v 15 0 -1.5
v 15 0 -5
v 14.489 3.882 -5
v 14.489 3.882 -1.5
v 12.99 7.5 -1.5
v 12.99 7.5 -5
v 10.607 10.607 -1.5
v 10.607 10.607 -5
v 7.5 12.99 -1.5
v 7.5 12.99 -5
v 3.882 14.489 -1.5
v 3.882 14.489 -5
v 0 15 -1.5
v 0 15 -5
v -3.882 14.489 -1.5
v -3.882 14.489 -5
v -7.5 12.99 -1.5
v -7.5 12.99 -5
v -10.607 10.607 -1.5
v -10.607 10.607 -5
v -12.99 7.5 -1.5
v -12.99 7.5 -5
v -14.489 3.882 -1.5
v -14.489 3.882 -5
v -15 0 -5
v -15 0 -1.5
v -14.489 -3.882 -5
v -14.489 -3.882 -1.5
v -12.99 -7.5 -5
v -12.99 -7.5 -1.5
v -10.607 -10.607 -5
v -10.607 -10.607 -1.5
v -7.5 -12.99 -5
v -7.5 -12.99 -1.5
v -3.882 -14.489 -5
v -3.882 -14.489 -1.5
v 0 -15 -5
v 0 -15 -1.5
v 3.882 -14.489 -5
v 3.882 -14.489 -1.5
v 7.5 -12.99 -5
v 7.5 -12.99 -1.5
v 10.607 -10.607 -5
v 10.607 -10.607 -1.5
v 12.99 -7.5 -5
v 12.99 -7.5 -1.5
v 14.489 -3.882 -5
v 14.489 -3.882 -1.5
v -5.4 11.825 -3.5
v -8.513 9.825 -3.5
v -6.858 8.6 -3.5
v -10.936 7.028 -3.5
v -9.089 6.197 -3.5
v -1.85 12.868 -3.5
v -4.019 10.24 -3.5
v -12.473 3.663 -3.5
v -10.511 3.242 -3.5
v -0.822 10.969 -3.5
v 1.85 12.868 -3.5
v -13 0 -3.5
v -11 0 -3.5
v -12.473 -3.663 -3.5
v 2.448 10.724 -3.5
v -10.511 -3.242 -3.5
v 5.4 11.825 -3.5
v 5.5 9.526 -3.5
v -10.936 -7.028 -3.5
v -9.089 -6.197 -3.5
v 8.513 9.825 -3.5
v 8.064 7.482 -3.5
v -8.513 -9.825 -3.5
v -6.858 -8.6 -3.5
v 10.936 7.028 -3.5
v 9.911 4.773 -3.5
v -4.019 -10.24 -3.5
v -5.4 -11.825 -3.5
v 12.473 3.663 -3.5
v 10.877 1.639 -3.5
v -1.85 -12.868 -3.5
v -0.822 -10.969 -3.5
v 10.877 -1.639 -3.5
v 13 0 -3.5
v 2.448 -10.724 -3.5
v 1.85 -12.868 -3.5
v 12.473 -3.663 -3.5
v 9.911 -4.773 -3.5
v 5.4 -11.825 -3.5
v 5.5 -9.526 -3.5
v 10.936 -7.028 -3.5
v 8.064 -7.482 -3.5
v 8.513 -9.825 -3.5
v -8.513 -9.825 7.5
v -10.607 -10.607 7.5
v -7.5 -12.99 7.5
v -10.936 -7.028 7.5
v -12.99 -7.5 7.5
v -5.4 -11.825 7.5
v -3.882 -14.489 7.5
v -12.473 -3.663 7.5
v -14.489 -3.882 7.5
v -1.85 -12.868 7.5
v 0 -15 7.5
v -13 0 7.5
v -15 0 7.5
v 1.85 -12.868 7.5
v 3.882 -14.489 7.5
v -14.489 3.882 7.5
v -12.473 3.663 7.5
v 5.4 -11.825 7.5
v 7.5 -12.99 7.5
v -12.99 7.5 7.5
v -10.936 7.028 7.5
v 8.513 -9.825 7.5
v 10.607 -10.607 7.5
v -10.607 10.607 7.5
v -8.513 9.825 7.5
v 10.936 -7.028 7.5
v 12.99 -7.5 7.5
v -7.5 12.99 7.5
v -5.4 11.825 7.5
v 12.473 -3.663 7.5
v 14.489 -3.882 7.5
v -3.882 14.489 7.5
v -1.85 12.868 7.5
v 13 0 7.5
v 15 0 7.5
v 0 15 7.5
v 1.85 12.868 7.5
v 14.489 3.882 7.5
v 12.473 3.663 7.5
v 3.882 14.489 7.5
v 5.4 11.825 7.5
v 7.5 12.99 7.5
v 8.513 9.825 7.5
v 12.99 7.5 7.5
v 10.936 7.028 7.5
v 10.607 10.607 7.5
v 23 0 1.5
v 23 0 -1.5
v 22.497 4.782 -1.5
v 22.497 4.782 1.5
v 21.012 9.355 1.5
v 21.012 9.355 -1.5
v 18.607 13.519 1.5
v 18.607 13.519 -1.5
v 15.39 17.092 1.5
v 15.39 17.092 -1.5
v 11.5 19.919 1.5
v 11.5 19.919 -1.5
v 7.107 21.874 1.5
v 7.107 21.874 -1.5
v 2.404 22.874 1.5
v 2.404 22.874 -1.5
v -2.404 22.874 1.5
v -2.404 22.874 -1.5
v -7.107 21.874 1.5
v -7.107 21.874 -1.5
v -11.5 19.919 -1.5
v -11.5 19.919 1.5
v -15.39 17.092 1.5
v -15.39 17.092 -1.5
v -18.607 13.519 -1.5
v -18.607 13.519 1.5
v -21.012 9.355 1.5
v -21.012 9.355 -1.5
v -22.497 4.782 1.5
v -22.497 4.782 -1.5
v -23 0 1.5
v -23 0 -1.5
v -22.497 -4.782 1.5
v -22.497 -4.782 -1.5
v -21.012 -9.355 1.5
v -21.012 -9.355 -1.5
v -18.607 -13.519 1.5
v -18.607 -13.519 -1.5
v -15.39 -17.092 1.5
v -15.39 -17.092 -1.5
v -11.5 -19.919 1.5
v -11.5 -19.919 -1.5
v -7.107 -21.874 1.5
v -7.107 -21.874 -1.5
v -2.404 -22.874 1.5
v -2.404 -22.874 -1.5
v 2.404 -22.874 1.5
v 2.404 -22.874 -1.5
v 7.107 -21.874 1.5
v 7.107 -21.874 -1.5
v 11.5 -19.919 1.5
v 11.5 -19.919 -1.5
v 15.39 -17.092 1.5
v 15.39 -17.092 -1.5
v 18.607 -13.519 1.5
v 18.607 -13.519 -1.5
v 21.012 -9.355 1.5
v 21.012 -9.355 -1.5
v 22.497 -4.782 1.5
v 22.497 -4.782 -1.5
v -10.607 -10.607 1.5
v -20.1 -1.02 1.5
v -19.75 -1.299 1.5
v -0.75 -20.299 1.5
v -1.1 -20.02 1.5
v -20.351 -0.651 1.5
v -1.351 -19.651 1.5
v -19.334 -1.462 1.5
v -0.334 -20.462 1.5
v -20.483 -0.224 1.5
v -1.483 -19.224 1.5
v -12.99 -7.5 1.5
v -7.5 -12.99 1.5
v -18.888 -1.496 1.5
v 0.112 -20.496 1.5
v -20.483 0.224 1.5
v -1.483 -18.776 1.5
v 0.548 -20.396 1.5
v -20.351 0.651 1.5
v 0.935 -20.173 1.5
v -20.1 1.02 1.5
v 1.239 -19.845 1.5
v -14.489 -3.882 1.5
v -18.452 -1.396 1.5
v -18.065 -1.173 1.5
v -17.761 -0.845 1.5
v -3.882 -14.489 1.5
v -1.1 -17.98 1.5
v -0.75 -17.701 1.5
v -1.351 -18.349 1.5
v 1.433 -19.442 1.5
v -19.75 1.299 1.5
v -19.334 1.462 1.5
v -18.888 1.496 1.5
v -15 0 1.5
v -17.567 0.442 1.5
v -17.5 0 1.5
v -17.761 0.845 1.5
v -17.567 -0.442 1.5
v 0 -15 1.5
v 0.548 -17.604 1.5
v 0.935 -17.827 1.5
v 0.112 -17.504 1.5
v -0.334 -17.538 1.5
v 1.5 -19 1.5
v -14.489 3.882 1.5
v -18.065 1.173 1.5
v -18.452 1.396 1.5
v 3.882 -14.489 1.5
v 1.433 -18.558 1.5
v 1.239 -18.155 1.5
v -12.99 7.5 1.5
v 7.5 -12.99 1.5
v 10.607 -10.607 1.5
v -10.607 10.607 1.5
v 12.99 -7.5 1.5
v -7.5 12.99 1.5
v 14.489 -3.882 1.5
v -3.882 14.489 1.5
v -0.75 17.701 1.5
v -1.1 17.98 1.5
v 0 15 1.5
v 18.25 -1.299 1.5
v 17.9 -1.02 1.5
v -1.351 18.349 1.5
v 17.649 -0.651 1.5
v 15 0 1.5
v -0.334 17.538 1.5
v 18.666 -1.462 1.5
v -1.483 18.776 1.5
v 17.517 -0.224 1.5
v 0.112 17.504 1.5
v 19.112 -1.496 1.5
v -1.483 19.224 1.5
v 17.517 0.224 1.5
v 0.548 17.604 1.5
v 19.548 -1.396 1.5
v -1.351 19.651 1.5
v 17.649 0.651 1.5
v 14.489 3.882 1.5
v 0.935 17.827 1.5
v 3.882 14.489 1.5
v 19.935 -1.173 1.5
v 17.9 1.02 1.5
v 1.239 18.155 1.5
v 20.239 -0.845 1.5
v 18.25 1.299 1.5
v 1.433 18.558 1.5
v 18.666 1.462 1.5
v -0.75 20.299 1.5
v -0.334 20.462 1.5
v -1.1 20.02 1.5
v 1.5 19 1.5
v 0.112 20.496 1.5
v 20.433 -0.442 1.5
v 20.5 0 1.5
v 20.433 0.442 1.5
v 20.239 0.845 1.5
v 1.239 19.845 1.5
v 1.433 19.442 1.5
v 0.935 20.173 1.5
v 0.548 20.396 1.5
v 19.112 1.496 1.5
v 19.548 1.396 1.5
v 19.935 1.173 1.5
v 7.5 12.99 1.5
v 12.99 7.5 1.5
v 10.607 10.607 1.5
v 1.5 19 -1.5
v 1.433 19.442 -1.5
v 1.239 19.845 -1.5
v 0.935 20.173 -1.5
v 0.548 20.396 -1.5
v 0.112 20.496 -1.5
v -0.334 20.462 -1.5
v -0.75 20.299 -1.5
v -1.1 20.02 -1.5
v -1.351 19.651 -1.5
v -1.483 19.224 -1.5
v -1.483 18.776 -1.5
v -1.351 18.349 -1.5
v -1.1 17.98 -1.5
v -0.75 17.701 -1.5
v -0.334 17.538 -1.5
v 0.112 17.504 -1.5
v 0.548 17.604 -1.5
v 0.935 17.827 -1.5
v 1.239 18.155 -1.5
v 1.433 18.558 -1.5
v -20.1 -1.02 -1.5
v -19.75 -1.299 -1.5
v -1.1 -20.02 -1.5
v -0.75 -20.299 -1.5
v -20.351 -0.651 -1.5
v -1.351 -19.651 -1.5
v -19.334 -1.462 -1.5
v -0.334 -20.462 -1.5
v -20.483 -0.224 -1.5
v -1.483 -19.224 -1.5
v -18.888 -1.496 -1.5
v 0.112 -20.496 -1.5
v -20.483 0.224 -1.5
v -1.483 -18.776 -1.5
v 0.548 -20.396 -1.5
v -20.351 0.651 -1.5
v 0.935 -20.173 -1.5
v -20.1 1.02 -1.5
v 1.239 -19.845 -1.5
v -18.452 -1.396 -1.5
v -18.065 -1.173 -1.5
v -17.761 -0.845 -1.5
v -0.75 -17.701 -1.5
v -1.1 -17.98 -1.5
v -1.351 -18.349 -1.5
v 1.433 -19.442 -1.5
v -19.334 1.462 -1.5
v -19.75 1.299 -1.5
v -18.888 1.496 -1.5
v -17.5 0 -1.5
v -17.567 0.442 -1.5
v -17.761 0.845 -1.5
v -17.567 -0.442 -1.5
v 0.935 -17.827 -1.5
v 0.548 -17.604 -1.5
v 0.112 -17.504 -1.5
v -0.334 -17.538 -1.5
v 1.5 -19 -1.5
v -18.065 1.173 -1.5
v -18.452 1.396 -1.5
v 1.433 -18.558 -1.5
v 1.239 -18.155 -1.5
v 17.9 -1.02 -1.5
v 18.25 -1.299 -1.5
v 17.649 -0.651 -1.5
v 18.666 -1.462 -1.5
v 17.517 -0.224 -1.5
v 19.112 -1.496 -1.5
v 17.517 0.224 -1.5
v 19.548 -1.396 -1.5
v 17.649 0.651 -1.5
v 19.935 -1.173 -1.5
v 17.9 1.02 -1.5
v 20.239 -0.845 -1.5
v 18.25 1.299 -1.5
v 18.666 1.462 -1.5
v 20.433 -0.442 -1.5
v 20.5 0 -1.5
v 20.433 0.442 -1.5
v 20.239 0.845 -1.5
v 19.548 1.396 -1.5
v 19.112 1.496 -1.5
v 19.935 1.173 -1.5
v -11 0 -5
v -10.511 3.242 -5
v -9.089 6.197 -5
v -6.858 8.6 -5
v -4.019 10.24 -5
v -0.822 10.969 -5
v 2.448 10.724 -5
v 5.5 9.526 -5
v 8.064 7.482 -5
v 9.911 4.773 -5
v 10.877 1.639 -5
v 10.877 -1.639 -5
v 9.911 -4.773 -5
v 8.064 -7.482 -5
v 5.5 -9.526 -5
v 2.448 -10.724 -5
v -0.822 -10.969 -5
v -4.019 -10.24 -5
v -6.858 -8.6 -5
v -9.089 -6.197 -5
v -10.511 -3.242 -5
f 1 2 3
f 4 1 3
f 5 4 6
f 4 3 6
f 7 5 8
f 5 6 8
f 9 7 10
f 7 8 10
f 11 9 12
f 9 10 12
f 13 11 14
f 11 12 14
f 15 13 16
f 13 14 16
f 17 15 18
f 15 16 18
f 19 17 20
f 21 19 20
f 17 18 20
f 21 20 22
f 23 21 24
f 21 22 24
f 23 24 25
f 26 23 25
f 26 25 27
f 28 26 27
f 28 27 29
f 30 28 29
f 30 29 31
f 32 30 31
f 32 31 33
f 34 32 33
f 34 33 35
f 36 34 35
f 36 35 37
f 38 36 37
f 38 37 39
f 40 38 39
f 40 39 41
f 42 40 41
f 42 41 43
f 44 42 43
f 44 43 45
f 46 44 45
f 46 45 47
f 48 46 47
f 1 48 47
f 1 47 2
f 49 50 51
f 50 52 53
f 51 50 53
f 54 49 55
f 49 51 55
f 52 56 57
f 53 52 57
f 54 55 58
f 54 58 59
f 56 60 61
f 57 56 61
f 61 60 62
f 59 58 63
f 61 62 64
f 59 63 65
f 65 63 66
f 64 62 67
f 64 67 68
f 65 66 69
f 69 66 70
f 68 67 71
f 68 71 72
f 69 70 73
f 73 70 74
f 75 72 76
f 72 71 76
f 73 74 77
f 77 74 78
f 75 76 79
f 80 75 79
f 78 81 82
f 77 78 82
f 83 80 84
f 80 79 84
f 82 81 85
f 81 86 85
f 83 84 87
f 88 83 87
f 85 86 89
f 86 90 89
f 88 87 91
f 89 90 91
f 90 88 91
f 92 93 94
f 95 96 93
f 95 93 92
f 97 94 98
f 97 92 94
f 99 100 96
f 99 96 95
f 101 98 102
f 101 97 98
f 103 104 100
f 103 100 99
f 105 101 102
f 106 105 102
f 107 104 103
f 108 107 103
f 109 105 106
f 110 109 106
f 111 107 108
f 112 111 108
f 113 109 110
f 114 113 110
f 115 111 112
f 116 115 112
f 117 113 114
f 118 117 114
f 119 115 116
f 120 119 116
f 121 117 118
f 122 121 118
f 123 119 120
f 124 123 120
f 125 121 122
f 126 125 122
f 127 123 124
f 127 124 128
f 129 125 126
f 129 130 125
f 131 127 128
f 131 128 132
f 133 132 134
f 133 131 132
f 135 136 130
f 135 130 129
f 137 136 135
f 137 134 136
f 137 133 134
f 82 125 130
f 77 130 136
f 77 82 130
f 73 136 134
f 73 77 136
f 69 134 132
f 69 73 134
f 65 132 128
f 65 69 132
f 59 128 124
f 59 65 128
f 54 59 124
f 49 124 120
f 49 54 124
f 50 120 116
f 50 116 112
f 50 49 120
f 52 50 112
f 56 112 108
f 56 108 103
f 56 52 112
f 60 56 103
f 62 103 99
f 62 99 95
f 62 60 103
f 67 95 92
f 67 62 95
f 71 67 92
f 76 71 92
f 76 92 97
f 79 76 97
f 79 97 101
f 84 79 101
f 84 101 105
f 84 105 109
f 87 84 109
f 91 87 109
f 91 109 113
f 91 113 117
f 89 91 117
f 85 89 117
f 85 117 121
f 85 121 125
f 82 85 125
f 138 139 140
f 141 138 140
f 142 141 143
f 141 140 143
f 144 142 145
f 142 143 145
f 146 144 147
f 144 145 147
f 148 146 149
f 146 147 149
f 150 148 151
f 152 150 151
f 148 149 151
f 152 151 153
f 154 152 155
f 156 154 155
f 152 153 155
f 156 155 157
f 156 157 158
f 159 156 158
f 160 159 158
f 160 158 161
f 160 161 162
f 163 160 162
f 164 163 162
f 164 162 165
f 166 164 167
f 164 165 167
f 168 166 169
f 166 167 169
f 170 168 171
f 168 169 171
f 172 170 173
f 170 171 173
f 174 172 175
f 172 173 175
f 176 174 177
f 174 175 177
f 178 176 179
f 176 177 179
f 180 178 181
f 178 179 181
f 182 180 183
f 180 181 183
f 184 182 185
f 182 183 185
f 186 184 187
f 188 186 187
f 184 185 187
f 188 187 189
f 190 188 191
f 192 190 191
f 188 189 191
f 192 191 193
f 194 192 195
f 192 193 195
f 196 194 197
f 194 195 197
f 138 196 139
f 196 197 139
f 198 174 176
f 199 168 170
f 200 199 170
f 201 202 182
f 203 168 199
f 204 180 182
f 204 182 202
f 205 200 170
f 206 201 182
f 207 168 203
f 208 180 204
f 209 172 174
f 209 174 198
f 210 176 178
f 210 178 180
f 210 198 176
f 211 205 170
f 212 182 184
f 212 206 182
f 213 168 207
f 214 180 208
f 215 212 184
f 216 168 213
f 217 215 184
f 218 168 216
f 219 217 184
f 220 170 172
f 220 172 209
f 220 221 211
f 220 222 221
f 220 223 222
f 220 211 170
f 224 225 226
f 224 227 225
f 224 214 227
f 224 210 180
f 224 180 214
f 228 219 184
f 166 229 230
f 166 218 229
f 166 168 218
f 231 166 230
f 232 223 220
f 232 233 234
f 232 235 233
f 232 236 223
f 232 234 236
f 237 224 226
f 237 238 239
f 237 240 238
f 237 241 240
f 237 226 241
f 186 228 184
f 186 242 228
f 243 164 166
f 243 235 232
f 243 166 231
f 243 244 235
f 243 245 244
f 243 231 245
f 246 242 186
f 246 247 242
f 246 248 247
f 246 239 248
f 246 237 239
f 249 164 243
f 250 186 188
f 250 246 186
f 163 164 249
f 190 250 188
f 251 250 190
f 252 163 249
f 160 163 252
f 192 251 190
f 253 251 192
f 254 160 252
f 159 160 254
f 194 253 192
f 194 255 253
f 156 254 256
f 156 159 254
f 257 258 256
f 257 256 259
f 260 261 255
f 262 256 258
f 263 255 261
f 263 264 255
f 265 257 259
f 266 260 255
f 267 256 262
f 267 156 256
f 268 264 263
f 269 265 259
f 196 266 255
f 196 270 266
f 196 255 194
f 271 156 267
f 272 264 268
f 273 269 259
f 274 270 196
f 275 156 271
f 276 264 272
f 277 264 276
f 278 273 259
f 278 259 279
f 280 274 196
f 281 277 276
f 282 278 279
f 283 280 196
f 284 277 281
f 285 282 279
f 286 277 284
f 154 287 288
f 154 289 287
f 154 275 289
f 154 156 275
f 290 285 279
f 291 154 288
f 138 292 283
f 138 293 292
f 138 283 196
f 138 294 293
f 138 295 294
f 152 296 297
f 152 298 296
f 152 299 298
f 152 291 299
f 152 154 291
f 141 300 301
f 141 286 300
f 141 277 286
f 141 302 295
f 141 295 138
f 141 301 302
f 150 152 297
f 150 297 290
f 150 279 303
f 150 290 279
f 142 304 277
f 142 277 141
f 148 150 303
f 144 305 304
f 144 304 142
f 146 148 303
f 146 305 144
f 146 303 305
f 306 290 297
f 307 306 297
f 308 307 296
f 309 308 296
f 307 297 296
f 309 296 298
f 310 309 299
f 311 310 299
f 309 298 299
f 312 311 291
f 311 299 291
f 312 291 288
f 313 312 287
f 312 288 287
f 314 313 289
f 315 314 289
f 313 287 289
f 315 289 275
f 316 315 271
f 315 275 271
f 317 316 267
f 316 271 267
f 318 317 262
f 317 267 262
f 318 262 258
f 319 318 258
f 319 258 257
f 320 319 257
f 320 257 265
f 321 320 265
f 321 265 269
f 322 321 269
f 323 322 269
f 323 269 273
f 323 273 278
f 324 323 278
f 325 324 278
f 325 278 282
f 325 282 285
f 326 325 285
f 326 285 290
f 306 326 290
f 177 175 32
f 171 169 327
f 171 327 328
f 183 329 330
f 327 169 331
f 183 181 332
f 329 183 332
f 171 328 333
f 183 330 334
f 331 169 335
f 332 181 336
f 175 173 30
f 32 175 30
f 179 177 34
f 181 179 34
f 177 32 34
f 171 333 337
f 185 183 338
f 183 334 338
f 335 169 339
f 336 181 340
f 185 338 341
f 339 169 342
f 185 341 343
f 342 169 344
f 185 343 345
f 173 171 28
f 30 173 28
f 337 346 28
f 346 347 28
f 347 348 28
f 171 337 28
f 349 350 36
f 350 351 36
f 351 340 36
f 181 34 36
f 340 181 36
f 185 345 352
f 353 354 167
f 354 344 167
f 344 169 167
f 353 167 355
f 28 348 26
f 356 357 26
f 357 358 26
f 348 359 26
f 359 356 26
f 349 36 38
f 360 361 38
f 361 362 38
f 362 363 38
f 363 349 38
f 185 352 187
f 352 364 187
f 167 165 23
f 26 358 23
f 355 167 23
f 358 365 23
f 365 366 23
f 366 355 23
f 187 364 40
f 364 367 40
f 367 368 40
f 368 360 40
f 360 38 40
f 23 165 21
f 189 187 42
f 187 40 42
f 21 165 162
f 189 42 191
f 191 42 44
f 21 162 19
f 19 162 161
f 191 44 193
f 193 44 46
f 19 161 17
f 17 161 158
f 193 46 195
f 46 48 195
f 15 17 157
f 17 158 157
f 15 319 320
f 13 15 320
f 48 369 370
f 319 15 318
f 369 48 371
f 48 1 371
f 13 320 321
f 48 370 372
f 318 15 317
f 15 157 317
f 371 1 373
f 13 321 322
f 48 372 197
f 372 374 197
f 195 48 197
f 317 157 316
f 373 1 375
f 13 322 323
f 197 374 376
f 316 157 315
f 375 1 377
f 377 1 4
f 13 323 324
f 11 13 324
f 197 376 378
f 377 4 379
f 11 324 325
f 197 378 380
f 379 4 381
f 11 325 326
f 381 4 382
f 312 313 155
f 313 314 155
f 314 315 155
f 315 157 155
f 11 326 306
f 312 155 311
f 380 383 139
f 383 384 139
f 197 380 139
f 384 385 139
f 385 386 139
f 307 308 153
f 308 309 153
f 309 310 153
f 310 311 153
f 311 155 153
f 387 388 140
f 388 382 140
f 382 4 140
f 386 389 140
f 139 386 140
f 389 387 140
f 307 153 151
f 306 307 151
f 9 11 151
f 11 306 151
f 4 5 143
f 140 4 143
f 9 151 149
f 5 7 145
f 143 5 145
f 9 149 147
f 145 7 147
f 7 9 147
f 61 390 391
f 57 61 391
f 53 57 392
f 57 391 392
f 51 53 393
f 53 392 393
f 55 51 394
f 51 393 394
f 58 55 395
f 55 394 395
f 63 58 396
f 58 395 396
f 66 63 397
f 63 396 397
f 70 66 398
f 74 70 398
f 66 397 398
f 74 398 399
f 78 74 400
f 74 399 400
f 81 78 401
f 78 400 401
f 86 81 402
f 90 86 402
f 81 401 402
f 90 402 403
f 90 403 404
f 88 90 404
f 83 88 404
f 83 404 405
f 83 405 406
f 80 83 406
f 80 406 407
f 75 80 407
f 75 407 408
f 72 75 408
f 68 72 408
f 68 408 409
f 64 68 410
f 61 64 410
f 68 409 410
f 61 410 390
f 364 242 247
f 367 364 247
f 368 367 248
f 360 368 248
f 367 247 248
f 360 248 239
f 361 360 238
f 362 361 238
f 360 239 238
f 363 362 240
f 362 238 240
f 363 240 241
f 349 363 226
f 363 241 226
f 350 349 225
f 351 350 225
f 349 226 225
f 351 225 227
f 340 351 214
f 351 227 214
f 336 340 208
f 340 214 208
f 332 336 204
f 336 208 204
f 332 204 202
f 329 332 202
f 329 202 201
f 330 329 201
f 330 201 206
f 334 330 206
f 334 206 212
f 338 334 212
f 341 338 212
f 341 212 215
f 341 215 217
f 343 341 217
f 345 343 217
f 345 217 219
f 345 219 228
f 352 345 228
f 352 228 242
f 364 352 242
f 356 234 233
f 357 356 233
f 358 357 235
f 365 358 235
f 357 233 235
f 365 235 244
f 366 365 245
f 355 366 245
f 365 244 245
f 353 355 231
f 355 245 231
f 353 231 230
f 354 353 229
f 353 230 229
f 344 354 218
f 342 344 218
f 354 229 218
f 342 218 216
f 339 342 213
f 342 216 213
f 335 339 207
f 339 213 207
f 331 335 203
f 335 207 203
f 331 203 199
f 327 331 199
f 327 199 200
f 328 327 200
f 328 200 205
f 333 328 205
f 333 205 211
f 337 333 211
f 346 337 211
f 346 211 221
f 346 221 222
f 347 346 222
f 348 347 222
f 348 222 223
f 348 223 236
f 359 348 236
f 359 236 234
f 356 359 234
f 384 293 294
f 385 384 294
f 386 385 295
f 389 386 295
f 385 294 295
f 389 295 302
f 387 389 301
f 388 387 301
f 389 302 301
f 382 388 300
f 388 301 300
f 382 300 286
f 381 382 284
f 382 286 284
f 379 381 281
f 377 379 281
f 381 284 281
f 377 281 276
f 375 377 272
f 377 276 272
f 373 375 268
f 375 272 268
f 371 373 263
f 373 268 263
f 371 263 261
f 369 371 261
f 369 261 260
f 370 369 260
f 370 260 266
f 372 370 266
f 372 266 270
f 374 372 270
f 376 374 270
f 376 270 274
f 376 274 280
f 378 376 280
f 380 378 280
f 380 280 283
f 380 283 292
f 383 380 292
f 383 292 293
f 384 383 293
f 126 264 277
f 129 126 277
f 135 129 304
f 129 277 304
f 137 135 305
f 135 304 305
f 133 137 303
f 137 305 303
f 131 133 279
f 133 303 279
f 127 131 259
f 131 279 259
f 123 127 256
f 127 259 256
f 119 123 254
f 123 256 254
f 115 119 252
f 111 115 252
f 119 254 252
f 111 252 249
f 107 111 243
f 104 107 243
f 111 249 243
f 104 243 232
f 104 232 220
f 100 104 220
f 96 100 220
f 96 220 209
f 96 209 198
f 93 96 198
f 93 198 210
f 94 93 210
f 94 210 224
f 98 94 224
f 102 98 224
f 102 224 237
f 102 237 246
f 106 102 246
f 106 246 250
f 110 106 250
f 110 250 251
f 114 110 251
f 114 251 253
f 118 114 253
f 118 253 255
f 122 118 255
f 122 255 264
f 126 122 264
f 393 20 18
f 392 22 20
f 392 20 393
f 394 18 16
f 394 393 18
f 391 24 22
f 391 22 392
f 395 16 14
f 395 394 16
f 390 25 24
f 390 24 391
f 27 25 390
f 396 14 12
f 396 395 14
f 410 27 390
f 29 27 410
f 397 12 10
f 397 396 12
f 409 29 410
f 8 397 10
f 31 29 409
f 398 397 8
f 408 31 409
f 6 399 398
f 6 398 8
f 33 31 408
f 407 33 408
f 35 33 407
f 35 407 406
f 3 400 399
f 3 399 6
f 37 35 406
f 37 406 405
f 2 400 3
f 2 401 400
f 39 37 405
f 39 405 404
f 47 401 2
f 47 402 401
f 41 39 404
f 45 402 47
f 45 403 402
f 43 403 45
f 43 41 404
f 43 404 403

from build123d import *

# Parameters (mm, degrees)
BOSS_EXTRUDE1_DEPTH      = 7.5
BOSS_EXTRUDE1_DEPTH_BACK = 5
SKETCH1_R                = 15
SKETCH1_R_2              = 13
BOSS_EXTRUDE2_DEPTH      = 1.5
BOSS_EXTRUDE2_DEPTH_BACK = 1.5
SKETCH2_R                = 23
SKETCH2_R_2              = 15
SKETCH4_R                = 13
SKETCH4_R_2              = 11
BOSS_EXTRUDE3_DEPTH      = 1.5
SKETCH6_R                = 1.5
CUT_EXTRUDE1_DEPTH       = 10


with BuildPart() as part:
    # Sketch1 → Boss-Extrude1 (new, two sides: drawn at the far end of the back side and taken through both)
    with BuildSketch(Plane.XY.offset(-BOSS_EXTRUDE1_DEPTH_BACK)):
        Circle(SKETCH1_R)
        Circle(SKETCH1_R_2, mode=Mode.SUBTRACT)
    extrude(amount=BOSS_EXTRUDE1_DEPTH + BOSS_EXTRUDE1_DEPTH_BACK)

    # Sketch2 → Boss-Extrude2 (add, two sides: drawn at the far end of the back side and taken through both)
    with BuildSketch(Plane.XY.offset(-BOSS_EXTRUDE2_DEPTH_BACK)):
        Circle(SKETCH2_R)
        Circle(SKETCH2_R_2, mode=Mode.SUBTRACT)
    extrude(amount=BOSS_EXTRUDE2_DEPTH + BOSS_EXTRUDE2_DEPTH_BACK)

    # Sketch4 → Boss-Extrude3 (add)
    with BuildSketch(Plane(origin=(0, 0, -5), x_dir=(-1, 0, 0), z_dir=(0, 0, -1))):
        with Locations(Location((0, 0, 0), (0, 0, 180))):
            Circle(SKETCH4_R)
        Circle(SKETCH4_R_2, mode=Mode.SUBTRACT)
    extrude(amount=-BOSS_EXTRUDE3_DEPTH)

    # Sketch6 → Cut-Extrude1 (cut)
    with BuildSketch(Plane.XY.offset(1.5)):
        with Locations((0, 19)):
            Circle(SKETCH6_R)
        with Locations((19, 0)):
            Circle(SKETCH6_R)
        with Locations((0, -19)):
            Circle(SKETCH6_R)
        with Locations((-19, 0)):
            Circle(SKETCH6_R)
    extrude(amount=-CUT_EXTRUDE1_DEPTH, mode=Mode.SUBTRACT)


solid = part.part
